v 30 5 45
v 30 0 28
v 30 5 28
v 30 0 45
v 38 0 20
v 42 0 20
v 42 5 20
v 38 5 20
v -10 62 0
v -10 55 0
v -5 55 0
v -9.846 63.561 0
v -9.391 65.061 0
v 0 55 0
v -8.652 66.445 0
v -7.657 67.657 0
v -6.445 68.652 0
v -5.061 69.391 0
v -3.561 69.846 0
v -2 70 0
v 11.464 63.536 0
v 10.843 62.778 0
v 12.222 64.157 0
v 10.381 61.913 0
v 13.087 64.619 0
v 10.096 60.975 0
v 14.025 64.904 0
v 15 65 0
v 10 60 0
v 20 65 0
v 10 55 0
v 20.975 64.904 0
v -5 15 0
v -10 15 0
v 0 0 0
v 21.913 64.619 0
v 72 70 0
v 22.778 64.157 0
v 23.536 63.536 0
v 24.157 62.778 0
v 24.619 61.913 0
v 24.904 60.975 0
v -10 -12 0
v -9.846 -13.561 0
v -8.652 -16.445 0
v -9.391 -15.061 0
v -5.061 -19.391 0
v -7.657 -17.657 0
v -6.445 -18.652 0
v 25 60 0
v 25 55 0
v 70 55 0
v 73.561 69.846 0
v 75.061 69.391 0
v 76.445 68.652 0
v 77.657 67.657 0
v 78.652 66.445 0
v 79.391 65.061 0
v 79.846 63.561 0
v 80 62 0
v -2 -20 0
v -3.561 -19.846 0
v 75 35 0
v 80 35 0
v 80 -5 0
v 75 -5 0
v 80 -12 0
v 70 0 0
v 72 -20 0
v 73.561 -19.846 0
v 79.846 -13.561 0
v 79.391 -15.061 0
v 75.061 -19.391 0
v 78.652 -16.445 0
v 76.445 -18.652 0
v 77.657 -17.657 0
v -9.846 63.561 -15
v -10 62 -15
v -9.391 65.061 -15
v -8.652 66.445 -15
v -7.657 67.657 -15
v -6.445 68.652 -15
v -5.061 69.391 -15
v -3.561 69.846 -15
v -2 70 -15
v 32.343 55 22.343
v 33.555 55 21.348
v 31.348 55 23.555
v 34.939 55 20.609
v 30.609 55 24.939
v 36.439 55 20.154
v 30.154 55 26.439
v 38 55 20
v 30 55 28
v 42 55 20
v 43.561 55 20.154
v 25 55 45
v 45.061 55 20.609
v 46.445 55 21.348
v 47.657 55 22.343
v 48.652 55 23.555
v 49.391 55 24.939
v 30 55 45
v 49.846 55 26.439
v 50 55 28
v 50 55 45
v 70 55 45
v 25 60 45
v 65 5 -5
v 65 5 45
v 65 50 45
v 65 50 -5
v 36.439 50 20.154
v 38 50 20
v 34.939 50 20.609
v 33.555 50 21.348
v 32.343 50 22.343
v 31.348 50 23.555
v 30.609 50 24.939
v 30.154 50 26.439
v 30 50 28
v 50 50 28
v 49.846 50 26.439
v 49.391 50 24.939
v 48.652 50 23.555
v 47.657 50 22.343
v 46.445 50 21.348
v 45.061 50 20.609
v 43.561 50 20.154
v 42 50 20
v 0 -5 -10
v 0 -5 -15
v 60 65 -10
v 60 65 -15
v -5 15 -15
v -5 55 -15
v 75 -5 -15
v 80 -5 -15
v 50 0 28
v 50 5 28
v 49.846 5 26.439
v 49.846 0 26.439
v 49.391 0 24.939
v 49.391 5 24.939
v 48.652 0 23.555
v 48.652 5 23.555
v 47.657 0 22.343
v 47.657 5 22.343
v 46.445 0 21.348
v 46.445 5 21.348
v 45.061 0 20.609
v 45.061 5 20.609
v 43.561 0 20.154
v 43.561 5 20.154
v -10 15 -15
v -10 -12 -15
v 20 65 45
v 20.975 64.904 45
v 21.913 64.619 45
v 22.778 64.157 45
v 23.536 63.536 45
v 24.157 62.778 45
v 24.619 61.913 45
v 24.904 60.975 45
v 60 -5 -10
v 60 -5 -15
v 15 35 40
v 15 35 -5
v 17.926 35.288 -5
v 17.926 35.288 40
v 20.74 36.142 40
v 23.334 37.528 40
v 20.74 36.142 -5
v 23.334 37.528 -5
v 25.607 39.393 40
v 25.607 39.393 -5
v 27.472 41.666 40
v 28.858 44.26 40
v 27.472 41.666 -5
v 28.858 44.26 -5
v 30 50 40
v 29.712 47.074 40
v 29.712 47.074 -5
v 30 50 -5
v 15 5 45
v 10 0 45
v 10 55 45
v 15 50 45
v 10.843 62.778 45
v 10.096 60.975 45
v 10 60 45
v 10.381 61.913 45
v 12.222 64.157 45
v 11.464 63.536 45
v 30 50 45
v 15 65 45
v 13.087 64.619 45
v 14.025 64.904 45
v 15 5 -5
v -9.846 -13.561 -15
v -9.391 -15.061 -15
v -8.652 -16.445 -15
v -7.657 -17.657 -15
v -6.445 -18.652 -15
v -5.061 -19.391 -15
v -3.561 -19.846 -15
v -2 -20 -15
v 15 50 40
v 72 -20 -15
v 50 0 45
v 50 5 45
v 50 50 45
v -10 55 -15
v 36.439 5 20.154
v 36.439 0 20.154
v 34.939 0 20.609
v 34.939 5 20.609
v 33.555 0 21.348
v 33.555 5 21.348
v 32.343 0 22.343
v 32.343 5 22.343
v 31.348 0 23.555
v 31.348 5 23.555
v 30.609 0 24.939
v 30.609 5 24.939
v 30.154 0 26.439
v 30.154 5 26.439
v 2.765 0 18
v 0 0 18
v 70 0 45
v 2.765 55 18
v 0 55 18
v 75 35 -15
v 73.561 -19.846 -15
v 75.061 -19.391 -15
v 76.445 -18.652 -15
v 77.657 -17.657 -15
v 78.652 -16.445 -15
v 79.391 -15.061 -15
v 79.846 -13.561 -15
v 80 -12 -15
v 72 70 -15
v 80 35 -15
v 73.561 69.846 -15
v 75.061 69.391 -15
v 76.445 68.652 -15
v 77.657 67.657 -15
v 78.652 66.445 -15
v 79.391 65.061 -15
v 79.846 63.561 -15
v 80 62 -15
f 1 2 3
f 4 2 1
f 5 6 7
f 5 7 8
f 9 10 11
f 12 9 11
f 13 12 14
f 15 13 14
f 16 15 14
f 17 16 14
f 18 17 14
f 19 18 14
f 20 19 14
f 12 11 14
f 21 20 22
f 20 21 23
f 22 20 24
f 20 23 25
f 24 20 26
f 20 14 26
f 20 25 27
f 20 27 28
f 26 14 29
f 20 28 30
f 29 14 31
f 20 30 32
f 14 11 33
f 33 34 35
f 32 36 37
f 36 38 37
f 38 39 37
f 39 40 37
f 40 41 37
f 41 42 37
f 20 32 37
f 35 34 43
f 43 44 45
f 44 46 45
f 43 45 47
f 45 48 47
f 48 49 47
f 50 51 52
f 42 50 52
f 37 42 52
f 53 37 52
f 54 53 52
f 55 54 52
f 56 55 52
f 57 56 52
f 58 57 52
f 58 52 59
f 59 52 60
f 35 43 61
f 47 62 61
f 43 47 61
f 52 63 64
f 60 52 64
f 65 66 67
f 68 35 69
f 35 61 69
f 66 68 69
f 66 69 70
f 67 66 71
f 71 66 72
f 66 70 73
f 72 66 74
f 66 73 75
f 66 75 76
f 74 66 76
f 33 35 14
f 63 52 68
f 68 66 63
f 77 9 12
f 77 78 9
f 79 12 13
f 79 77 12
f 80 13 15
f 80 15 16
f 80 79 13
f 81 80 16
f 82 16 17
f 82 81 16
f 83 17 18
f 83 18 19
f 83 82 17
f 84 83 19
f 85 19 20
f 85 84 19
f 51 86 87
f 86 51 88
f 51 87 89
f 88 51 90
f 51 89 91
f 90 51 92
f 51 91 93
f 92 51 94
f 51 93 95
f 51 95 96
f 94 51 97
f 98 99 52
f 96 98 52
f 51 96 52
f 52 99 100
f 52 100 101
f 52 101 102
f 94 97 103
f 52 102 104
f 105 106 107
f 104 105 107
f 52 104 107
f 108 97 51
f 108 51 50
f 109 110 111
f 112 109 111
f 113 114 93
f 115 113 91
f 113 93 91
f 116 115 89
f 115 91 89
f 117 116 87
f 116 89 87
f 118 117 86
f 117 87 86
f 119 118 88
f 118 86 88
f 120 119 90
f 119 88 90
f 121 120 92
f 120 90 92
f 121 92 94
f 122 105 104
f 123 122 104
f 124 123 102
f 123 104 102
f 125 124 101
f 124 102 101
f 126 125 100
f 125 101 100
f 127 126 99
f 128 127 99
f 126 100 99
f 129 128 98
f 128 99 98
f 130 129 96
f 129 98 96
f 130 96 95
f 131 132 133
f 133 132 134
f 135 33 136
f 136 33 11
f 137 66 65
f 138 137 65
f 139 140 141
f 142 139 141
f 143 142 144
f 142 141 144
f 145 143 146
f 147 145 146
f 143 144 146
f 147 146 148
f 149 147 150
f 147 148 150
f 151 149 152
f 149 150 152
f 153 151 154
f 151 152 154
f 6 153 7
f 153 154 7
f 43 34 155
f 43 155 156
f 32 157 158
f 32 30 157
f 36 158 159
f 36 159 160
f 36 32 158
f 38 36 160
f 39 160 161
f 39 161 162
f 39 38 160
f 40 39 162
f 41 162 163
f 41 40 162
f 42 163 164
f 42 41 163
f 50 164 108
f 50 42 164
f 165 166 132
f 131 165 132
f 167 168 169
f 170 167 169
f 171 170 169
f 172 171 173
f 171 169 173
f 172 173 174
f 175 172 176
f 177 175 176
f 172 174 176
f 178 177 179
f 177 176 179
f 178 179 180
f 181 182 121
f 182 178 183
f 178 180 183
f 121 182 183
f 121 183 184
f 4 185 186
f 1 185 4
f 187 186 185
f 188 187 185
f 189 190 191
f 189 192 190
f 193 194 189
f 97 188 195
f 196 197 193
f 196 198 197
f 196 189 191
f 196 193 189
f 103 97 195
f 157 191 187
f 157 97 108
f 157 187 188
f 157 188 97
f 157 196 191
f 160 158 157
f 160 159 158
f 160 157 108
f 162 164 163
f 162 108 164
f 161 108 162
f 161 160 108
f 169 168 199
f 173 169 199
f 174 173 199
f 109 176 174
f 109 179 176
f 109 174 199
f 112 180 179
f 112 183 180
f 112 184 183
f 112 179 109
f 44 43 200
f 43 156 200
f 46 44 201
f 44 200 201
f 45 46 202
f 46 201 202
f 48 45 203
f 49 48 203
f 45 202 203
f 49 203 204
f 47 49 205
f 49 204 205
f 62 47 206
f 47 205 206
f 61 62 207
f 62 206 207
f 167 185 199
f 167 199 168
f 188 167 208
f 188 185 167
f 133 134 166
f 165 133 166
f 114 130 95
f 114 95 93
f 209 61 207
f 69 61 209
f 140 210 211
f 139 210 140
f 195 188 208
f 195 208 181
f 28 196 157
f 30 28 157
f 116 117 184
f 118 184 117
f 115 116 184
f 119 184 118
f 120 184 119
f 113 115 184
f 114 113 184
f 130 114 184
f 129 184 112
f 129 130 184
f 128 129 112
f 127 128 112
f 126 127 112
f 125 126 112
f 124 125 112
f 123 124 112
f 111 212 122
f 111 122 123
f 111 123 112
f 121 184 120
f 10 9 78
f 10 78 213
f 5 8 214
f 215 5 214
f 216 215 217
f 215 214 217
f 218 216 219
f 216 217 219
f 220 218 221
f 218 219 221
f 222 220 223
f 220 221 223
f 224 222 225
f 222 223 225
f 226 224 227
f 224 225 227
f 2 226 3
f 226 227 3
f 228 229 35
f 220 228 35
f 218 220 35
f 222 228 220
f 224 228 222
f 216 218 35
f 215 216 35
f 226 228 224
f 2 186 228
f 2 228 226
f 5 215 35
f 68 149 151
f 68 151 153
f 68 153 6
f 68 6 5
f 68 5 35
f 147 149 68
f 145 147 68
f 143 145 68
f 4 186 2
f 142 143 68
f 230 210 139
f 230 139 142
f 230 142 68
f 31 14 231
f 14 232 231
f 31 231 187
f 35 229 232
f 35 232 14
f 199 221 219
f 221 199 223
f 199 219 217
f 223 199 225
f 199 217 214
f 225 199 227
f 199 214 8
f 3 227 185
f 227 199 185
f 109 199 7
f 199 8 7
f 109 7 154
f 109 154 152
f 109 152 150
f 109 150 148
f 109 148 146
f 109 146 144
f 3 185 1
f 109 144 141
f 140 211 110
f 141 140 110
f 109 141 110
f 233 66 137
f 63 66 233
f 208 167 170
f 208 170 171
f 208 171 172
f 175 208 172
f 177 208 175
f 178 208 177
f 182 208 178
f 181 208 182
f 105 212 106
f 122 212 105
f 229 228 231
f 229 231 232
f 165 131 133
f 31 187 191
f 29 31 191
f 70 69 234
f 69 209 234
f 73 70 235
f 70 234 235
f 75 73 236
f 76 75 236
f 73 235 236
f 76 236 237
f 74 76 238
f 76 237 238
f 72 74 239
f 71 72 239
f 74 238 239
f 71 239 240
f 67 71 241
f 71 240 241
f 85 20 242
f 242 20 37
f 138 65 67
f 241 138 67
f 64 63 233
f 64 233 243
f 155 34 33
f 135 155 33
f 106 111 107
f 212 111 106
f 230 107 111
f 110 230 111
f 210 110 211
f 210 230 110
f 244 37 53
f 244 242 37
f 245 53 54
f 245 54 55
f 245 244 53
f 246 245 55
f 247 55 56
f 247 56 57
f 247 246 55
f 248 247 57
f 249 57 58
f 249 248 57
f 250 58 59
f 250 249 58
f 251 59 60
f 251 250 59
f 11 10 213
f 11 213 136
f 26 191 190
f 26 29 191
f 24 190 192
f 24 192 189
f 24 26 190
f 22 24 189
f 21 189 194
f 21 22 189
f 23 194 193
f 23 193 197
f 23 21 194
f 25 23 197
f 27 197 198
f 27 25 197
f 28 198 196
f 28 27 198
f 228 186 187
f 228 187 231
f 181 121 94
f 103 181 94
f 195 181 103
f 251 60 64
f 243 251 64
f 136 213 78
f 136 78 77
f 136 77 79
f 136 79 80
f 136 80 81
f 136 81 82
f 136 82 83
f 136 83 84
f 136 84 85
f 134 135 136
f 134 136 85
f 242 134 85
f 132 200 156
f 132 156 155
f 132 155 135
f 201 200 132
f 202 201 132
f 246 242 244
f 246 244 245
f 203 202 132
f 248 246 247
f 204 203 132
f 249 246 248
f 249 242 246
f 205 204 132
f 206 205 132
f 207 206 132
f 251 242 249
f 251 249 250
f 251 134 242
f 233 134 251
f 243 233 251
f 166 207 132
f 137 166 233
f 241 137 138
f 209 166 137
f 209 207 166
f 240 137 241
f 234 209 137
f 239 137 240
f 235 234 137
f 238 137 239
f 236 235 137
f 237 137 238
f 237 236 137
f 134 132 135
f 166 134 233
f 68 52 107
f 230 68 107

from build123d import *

# Parameters (mm, degrees)
F1_DEPTH  = 55
F2_R      = 8
F3_W      = 90
F3_H      = 90
F4_DEPTH  = 15
F5_R      = 8
F6_W      = 15
F6_H      = 10
F7_DEPTH  = 45
F8_R      = 5
F9_W      = 50
F9_H      = 45
F10_DEPTH = 50
F12_DEPTH = 45
F13_W     = 5
F13_H     = 40
F14_DEPTH = 15.001
F16_DEPTH = 5


with BuildPart() as f1:
    # F0 (on Front) → F1 (new body)
    with BuildSketch(Plane.XZ):
        Polygon((0, 18), (0, 0), (70, 0), (70, 45), (50, 45), (50, 20), (30, 20), (30, 45), (10, 45), (2.765372, 18), align=None)
    extrude(amount=-F1_DEPTH)

    # F2
    f2_edges = [f1.edges().sort_by_distance(p)[0] for p in [
        (30, 27.5, 20),
        (50, 27.5, 20),
    ]]
    fillet(f2_edges, radius=F2_R)

    # F3 (on face) → F4 (join)
    with BuildSketch(Plane(origin=(0, 0, 0), x_dir=(1, 0, 0), z_dir=(0, 0, -1))):
        with Locations((35, -25)):
            Rectangle(F3_W, F3_H)
    extrude(amount=F4_DEPTH)

    # F5
    f5_edges = [f1.edges().sort_by_distance(p)[0] for p in [
        (-10, 70, -7.5),
        (80, 70, -7.5),
        (-10, -20, -7.5),
        (80, -20, -7.5),
    ]]
    fillet(f5_edges, radius=F5_R)

    # F6 (on face) → F7 (join, through all)
    with BuildSketch(Plane.XY.offset(45)):
        with Locations((17.5, 60)):
            Rectangle(F6_W, F6_H)
    extrude(amount=-F7_DEPTH)

    # F8
    f8_edges = [f1.edges().sort_by_distance(p)[0] for p in [
        (25, 65, 22.5),
        (10, 65, 22.5),
    ]]
    fillet(f8_edges, radius=F8_R)

    # F9 (on face) → F10 (cut)
    with BuildSketch(Plane.XY.offset(45)):
        with Locations((40, 27.5)):
            Rectangle(F9_W, F9_H)
    extrude(amount=-F10_DEPTH, mode=Mode.SUBTRACT)

    # F11 (on face) → F12 (join)
    with BuildSketch(Plane.XY.offset(-5)):
        with BuildLine():
            Line((30, 50), (15, 50))
            Line((15, 50), (15, 35))
            ThreePointArc((15, 35), (25.606602, 39.393398), (30, 50))
        make_face()
    extrude(amount=F12_DEPTH)

    # F13 (on face) → F14 (cut, through all)
    with BuildSketch(Plane.XY):
        with Locations((-7.5, 35)):
            Rectangle(F13_W, F13_H)
        with Locations((77.5, 15)):
            Rectangle(F13_W, F13_H)
    extrude(amount=-F14_DEPTH, mode=Mode.SUBTRACT)

    # F15 (on face) → F16 (cut)
    with BuildSketch(Plane(origin=(0, 0, -15), x_dir=(1, 0, 0), z_dir=(0, 0, -1))):
        Polygon((0, 5), (60, -65), (60, 5), align=None)
    extrude(amount=-F16_DEPTH, mode=Mode.SUBTRACT)


solid = f1.part
